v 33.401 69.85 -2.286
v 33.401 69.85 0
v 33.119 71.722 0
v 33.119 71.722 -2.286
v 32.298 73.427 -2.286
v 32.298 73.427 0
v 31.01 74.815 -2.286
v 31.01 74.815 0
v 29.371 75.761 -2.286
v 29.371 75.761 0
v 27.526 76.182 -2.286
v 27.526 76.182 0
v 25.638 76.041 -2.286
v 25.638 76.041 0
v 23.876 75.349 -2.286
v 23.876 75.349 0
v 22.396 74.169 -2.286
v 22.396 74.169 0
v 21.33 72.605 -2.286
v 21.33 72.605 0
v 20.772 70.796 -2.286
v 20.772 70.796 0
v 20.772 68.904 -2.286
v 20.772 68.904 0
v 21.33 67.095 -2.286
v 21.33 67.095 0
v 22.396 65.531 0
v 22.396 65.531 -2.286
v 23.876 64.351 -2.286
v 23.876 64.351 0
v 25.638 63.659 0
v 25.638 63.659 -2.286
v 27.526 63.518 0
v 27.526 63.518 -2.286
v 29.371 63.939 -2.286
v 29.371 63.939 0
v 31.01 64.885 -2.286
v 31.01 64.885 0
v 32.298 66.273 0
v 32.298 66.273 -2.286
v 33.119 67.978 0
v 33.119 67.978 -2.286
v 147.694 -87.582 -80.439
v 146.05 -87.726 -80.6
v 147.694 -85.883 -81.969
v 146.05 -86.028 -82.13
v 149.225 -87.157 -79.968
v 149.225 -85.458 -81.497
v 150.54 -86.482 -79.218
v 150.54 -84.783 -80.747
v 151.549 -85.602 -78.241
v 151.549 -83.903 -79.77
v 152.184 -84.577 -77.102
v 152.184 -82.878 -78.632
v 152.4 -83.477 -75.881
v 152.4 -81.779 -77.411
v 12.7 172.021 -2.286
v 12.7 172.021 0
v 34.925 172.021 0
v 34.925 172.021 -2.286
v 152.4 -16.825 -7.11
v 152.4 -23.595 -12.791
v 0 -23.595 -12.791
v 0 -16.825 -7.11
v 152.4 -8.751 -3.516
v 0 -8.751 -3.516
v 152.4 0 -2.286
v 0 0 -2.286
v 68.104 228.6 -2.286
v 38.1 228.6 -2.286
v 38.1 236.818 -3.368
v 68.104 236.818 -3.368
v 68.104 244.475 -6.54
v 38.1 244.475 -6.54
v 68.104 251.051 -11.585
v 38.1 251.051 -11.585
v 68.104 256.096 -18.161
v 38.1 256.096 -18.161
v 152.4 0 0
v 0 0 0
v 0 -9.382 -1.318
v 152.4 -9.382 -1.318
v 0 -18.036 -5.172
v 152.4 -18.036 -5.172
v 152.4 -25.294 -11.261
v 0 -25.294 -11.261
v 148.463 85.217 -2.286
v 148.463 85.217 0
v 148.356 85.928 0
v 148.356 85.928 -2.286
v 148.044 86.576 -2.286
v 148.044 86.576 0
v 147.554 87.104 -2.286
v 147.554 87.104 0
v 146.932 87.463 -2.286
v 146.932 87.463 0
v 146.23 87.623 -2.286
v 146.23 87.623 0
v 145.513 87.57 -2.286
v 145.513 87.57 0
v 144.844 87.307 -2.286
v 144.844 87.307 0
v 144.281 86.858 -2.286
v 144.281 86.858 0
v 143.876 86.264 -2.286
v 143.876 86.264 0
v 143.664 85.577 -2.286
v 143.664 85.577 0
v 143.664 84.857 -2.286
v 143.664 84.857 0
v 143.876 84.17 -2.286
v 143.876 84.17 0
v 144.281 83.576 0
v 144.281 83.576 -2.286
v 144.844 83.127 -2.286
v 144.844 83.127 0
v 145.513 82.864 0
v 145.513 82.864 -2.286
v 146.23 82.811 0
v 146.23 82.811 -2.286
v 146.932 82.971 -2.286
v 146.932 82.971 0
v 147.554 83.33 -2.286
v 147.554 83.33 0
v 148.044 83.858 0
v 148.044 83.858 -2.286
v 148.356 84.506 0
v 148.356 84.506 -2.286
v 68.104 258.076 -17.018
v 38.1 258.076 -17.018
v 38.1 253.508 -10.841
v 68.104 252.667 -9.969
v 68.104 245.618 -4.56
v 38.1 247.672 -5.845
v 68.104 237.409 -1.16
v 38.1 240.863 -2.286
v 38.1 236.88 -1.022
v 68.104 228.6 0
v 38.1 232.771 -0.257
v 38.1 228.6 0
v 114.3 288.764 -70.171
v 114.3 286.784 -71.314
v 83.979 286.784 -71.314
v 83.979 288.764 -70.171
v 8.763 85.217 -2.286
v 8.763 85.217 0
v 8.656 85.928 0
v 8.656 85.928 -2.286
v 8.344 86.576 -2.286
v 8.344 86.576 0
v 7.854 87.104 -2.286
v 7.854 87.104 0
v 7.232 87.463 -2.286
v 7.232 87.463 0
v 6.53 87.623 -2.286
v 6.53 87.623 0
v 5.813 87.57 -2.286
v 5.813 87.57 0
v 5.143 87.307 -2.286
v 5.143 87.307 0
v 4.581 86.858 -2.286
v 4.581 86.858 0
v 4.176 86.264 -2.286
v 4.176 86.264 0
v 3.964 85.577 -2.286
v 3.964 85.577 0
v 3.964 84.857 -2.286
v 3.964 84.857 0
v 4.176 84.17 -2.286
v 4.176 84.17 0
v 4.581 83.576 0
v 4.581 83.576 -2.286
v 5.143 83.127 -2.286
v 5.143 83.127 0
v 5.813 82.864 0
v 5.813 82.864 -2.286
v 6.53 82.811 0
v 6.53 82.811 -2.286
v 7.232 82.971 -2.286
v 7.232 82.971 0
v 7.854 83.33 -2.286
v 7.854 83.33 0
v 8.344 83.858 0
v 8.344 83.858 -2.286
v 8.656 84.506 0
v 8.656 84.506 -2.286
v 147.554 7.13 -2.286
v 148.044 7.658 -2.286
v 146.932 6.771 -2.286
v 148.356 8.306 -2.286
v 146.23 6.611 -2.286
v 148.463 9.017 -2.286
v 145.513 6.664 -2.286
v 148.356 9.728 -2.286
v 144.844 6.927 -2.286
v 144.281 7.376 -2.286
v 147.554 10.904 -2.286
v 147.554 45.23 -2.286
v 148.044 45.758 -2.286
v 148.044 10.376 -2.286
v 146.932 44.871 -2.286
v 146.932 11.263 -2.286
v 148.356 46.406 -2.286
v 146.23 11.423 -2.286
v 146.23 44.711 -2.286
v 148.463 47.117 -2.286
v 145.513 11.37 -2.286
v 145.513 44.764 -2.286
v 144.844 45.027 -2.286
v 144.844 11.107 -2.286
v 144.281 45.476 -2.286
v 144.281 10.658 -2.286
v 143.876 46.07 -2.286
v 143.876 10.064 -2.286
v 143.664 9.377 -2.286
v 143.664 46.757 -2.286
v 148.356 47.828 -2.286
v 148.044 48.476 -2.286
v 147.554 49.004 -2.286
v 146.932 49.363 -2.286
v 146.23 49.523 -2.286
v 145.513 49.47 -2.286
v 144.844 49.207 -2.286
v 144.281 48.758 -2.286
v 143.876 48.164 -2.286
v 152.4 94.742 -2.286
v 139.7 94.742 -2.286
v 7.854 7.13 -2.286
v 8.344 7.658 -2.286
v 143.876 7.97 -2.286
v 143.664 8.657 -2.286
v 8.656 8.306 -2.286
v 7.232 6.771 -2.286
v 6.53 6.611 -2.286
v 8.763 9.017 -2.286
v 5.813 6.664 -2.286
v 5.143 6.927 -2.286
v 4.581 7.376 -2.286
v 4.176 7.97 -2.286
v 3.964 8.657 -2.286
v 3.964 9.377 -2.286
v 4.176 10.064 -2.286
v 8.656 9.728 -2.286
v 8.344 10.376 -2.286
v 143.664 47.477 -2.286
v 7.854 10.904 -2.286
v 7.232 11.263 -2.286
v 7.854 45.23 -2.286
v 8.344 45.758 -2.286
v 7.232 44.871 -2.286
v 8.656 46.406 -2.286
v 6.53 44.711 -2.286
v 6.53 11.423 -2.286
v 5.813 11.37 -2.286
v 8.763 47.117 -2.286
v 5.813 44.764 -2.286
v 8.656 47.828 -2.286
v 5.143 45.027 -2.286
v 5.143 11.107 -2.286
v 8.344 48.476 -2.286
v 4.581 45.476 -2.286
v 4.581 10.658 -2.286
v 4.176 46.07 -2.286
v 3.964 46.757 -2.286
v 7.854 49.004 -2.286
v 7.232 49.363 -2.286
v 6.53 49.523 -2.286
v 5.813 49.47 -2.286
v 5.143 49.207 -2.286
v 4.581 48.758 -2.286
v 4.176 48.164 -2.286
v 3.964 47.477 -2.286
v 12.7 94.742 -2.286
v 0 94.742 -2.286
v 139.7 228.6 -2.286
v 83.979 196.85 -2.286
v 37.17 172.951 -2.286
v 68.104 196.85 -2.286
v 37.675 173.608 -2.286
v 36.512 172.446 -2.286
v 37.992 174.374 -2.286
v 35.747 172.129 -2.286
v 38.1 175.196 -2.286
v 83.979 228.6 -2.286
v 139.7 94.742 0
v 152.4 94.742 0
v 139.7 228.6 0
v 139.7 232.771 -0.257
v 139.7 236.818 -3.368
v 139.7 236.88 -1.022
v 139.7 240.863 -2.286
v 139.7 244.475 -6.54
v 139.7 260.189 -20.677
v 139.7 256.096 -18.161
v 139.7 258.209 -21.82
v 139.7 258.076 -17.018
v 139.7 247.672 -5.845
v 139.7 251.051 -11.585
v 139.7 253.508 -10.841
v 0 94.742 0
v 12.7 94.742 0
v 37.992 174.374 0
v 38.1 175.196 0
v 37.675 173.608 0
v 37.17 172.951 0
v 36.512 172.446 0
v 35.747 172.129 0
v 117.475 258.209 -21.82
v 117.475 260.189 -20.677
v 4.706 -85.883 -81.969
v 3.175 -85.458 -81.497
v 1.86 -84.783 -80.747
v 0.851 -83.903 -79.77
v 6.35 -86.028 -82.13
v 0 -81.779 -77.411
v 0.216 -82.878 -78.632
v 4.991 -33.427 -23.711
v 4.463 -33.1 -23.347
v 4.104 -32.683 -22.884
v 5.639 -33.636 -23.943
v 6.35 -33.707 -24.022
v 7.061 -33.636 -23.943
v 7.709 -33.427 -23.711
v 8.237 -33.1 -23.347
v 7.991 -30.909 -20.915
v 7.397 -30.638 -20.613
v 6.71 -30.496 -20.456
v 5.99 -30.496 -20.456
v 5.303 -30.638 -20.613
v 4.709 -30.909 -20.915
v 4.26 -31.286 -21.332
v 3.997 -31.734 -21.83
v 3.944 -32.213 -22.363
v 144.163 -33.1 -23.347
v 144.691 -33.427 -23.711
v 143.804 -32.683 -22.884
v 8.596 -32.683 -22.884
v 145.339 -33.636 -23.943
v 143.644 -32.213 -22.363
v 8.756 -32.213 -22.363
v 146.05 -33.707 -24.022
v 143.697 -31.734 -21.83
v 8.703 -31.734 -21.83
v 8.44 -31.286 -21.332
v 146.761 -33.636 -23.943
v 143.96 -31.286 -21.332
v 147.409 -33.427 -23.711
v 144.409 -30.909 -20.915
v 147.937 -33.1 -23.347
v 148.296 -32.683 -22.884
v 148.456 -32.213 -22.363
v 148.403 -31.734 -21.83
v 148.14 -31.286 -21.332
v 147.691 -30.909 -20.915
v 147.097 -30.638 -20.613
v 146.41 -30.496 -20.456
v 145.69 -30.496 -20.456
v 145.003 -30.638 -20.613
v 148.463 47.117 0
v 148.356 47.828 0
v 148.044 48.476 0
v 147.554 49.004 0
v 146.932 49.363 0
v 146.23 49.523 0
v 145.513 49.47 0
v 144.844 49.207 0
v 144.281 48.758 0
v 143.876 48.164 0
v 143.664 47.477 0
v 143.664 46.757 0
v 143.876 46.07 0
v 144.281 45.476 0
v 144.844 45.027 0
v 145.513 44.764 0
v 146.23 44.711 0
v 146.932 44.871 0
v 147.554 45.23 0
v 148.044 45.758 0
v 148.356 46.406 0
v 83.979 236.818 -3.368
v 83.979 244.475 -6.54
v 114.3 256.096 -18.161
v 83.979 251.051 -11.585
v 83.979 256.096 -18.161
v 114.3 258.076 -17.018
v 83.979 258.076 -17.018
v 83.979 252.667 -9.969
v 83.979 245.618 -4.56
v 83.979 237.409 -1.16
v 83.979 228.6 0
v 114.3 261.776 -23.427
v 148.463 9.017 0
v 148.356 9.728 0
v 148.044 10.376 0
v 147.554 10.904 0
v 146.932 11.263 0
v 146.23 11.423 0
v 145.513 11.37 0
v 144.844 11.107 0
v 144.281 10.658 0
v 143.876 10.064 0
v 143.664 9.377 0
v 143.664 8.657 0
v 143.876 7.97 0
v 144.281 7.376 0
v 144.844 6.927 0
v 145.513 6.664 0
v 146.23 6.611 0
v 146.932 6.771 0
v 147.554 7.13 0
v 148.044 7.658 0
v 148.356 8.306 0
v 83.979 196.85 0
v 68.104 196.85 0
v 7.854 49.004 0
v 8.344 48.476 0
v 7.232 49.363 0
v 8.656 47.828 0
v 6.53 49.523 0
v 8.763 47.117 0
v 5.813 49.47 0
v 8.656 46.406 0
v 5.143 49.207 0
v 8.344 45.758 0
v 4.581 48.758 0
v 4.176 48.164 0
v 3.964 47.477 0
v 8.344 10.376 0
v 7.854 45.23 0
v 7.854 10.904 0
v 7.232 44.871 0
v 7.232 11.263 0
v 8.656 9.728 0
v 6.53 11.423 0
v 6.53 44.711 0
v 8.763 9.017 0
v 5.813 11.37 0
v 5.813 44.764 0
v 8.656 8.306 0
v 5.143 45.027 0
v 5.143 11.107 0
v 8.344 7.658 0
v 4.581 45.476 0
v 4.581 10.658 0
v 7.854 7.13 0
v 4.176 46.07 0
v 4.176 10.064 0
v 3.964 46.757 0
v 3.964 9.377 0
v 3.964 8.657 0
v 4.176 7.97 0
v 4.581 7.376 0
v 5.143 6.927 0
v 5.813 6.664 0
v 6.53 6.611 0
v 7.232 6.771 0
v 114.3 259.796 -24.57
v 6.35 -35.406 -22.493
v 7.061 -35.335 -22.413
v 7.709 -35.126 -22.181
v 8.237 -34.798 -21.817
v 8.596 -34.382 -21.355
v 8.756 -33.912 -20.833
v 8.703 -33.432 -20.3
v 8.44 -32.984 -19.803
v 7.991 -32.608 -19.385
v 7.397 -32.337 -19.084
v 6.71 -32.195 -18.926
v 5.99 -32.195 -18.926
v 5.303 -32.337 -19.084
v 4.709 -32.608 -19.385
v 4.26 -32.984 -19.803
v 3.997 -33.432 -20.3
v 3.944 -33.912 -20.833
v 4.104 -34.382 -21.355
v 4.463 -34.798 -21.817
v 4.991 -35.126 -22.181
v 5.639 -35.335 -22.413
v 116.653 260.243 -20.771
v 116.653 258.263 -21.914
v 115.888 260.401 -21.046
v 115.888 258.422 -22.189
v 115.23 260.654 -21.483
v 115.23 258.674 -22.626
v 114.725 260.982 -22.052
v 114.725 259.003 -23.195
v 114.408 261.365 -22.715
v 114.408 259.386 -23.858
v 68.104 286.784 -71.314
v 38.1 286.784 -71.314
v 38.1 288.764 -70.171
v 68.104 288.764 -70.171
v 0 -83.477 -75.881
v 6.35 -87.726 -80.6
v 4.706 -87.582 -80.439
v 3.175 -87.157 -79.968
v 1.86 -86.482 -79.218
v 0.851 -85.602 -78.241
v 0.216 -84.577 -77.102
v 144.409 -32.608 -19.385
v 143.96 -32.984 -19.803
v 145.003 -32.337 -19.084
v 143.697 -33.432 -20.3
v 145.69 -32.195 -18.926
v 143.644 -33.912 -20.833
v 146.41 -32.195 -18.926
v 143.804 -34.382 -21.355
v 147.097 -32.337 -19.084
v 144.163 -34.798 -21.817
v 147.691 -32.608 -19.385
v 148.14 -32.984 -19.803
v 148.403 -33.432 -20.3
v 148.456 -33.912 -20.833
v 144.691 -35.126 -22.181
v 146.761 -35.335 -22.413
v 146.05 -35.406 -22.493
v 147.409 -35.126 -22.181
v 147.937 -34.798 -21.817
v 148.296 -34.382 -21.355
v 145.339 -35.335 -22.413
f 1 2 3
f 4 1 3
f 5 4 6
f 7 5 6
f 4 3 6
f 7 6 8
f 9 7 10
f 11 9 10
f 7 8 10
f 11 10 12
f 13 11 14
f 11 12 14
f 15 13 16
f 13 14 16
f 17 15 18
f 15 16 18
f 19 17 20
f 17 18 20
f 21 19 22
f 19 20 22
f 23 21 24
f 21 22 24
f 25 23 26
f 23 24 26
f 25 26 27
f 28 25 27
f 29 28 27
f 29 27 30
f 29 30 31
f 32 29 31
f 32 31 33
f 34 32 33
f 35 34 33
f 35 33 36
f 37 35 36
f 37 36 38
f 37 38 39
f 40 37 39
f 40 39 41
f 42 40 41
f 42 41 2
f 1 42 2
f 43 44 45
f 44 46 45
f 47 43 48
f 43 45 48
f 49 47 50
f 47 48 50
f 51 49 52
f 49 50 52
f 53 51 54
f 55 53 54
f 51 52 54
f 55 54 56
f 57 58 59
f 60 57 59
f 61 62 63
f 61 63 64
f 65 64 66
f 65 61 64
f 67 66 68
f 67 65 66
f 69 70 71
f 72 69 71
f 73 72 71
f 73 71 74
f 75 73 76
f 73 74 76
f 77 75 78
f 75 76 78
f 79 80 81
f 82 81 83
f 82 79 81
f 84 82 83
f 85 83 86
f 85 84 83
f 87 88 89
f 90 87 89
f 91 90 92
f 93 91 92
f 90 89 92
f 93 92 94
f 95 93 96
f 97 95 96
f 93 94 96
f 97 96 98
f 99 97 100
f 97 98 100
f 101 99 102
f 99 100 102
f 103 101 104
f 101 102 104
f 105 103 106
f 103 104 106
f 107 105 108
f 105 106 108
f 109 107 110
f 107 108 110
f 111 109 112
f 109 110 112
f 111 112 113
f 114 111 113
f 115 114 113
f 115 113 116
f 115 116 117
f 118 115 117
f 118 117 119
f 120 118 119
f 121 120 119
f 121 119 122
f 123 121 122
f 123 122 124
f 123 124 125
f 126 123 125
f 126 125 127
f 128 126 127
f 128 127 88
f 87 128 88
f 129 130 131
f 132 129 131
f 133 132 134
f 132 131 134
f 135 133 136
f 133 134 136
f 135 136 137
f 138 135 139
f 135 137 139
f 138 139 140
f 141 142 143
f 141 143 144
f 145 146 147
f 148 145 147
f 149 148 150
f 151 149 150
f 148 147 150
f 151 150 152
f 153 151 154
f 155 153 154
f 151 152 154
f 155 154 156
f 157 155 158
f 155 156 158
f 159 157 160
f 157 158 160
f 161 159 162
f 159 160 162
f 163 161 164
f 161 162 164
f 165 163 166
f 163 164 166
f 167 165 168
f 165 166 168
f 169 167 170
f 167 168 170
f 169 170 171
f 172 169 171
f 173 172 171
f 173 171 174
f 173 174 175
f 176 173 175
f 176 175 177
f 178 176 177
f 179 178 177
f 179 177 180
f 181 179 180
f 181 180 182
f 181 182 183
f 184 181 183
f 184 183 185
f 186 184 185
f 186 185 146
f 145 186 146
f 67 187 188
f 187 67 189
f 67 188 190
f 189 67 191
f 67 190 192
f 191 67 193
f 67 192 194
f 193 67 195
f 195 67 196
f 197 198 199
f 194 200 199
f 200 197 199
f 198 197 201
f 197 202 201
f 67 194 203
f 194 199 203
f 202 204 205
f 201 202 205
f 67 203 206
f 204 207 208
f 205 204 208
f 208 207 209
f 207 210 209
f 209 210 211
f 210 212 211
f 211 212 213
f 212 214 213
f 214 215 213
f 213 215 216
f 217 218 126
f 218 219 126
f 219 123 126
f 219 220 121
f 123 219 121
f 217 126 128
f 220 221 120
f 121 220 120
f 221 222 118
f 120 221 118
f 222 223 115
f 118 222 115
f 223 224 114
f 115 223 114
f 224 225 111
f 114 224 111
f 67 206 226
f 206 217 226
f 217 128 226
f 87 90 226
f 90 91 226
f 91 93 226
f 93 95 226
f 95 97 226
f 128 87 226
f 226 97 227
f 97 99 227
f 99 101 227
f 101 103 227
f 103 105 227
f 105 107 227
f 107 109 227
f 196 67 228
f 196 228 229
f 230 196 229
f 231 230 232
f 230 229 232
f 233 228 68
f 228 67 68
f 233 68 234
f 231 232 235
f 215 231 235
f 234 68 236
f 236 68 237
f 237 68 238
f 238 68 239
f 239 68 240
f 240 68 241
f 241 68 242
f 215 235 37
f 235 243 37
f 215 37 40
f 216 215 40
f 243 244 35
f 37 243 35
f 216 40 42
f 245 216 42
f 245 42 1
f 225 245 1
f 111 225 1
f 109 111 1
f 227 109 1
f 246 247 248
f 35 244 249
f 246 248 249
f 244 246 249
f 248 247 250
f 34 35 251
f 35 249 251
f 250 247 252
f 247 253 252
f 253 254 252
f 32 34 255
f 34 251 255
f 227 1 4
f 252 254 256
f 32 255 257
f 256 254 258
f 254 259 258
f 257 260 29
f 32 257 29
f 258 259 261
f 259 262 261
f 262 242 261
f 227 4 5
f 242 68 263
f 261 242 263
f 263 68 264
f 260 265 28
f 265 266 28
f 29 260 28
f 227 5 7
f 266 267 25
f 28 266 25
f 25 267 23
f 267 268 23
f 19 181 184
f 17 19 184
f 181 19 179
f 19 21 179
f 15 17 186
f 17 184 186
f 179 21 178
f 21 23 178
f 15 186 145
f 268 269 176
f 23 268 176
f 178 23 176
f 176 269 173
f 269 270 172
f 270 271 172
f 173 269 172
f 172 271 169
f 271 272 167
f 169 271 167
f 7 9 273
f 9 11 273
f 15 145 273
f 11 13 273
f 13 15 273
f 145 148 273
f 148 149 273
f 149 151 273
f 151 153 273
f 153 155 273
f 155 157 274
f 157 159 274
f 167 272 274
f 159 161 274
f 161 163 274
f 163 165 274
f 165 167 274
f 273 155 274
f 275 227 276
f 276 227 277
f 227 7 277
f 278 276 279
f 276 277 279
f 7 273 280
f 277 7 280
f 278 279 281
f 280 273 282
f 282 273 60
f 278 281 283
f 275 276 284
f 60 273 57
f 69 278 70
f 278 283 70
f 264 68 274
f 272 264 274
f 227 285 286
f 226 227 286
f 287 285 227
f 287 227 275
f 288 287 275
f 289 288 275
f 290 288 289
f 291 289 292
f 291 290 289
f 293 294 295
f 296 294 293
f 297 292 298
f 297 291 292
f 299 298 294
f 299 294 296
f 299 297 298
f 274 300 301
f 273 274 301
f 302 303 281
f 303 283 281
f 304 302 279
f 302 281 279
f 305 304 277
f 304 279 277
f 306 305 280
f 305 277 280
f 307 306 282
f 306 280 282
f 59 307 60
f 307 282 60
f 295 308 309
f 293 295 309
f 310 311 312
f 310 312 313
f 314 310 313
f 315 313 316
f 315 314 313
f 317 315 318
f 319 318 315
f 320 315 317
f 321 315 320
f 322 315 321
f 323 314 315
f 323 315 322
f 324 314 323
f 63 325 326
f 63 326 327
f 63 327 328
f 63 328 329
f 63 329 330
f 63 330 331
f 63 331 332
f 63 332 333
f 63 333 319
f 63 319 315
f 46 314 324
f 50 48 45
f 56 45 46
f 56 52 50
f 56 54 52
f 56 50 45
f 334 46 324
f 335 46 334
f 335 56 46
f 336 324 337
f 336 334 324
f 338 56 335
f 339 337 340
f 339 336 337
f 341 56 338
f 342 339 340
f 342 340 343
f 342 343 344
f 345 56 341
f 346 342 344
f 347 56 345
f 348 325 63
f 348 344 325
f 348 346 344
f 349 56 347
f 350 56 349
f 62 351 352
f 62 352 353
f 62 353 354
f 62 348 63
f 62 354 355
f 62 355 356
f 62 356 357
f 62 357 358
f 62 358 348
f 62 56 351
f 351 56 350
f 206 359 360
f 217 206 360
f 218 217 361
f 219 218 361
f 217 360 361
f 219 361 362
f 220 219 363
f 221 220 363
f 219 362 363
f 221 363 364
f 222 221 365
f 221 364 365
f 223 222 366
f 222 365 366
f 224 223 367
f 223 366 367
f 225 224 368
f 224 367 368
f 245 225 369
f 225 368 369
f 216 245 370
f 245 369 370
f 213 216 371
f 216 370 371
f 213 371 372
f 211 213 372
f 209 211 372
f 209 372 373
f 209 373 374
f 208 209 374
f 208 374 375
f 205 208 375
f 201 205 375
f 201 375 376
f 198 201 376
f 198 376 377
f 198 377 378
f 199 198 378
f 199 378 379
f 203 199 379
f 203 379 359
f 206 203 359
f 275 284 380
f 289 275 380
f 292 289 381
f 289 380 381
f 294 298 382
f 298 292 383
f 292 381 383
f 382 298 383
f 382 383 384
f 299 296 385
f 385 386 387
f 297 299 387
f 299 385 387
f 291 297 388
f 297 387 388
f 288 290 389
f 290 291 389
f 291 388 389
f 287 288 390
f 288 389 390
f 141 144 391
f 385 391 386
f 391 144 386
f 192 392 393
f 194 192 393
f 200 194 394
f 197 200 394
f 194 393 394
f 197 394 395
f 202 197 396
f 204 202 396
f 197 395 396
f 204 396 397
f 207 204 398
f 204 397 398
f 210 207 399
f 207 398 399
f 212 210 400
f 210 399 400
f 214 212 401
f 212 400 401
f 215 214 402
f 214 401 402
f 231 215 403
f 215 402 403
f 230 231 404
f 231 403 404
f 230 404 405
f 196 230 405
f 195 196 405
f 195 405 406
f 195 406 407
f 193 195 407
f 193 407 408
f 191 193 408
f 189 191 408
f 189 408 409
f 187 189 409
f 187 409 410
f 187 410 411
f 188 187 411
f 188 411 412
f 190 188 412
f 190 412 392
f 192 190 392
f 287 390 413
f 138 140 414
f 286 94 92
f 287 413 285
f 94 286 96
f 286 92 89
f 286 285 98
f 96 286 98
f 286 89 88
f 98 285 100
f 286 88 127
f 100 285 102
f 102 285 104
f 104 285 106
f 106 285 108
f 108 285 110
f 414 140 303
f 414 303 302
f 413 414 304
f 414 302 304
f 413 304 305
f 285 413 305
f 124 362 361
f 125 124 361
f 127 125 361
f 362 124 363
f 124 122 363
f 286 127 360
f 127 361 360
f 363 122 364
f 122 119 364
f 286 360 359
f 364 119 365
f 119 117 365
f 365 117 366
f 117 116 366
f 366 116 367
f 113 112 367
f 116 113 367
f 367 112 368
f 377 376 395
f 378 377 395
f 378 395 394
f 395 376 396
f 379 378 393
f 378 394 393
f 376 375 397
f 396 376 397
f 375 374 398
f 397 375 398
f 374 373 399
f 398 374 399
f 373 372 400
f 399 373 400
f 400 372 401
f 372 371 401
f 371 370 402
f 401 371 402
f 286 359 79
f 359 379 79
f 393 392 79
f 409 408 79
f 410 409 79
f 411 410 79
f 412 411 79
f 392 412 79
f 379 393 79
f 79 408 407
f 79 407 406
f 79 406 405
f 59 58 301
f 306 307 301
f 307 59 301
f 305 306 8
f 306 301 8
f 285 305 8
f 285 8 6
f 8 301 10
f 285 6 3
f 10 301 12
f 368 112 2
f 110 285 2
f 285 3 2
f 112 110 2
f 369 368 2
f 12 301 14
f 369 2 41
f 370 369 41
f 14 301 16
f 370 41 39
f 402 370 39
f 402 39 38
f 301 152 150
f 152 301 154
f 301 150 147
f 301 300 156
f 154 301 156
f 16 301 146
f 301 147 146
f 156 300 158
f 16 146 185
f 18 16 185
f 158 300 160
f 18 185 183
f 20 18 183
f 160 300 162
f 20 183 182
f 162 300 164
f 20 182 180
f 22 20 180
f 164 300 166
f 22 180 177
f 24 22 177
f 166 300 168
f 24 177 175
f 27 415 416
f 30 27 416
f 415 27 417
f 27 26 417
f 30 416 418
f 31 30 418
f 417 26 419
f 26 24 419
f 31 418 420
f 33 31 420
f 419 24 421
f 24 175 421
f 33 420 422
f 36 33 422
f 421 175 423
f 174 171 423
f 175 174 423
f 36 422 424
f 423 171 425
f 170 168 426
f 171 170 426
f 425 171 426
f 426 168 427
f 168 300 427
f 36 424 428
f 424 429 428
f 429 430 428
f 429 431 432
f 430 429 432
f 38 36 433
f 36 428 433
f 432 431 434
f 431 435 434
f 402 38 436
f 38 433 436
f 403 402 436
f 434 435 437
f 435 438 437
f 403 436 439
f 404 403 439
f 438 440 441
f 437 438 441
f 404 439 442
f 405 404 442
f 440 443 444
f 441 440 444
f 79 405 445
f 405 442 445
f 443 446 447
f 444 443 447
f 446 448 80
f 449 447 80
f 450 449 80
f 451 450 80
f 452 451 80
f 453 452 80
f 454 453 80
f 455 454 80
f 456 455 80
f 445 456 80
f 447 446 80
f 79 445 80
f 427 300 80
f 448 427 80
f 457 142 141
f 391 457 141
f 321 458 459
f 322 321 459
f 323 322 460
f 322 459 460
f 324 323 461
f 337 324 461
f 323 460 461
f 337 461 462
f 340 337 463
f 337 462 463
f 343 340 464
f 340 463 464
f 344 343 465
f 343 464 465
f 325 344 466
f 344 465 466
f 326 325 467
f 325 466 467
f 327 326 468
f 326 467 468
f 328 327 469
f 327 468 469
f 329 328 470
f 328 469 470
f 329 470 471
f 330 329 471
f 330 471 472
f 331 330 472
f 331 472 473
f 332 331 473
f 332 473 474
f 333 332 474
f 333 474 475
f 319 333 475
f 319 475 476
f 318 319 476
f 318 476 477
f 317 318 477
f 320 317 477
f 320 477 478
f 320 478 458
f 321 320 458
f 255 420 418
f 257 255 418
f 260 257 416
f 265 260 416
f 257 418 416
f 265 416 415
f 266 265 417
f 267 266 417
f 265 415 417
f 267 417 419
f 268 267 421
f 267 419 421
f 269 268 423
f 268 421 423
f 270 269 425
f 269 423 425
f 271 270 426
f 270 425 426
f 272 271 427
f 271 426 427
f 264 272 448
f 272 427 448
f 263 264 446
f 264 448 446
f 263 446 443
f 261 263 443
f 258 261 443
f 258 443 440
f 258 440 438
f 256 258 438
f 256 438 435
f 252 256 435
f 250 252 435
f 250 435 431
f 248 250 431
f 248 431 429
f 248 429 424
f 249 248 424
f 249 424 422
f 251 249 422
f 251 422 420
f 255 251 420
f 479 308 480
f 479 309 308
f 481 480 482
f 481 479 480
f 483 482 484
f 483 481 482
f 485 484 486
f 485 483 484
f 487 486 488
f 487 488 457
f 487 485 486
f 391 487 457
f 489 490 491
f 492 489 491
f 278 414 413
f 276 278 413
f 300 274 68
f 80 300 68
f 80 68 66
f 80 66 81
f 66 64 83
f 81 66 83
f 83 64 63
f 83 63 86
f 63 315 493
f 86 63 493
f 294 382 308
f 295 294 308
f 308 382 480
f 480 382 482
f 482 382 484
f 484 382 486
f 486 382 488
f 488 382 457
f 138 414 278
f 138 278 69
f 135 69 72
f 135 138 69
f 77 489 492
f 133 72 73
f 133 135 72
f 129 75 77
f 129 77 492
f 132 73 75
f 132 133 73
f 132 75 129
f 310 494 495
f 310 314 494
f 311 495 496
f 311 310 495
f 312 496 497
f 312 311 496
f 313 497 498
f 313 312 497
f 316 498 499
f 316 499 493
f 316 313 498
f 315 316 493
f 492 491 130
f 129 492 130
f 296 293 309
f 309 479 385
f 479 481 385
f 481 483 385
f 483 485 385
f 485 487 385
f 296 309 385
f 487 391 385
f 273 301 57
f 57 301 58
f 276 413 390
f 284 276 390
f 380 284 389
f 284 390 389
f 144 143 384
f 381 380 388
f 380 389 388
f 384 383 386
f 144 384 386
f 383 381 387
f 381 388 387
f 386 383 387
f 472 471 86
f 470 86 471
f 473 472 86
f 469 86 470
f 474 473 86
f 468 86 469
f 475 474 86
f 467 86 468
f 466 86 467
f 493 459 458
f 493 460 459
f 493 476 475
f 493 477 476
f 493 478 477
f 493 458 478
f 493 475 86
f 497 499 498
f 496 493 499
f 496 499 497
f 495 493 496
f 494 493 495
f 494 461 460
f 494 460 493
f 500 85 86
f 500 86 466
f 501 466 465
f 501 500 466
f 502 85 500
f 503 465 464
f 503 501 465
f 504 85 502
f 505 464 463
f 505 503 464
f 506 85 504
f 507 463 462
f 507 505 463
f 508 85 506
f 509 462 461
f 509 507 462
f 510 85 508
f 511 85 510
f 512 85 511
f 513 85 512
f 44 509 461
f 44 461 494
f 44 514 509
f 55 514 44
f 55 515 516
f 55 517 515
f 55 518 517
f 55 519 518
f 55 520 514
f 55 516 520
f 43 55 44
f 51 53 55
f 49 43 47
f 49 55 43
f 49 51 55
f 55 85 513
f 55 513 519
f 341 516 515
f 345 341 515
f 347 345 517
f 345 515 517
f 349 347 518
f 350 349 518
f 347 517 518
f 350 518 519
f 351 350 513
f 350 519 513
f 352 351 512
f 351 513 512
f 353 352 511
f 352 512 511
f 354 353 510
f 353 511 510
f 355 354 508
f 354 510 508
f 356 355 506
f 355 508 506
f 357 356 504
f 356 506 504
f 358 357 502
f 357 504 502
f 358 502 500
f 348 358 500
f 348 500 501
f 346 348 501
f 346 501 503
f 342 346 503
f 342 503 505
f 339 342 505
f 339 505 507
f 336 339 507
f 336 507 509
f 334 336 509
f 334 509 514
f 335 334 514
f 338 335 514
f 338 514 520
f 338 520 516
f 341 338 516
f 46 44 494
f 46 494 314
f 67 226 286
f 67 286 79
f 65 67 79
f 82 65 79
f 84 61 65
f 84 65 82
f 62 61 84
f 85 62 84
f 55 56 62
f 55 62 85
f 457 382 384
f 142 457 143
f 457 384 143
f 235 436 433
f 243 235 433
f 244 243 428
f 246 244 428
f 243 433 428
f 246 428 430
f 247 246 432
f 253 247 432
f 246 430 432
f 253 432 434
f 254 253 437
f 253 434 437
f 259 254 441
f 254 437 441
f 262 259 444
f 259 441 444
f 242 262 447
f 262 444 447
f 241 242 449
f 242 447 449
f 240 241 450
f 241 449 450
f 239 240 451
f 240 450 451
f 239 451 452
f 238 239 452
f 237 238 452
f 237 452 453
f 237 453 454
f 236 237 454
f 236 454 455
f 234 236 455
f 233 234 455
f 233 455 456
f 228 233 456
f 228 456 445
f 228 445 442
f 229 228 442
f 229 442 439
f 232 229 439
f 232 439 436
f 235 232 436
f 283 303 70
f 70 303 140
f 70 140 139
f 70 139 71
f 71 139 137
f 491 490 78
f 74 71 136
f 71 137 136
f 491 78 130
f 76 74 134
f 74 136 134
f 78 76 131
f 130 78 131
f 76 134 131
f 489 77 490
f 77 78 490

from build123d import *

# Parameters (mm, degrees)
BASE_FLANGE1_DEPTH = 2.286
SKETCH6_R          = 6.35
CUT_EXTRUDE1_DEPTH = 275.752517361
EDGE_FLANGE1_DEPTH = 152.4
FILLET1_R          = 6.35
EDGE_FLANGE2_DEPTH = 127
UNFOLD1_START      = 12.7
UNFOLD1_DEPTH      = 127
UNFOLD1_2_DEPTH    = 127
SKETCH15_W         = 25.4
SKETCH15_H         = 152.4
SKETCH15_H_2       = 57.15
CUT_EXTRUDE2_DEPTH = 2.54
FOLD1_START        = 38.1
FOLD1_DEPTH        = 101.6
FOLD1_2_DEPTH      = 76.2
FOLD1_START_2      = 114.3
FOLD1_3_DEPTH      = 25.4
FILLET2_R          = 3.175
SKETCH16_W         = 15.875
SKETCH16_H         = 203.2
CUT_EXTRUDE3_DEPTH = 337.68309673
SKETCH17_R         = 2.413
CUT_EXTRUDE4_DEPTH = 337.68309673
SKETCH18_R         = 2.413
CUT_EXTRUDE5_DEPTH = 2.54


# Read off the part's stored shape, not the designer's step: Unfold1, Fold1
# Sheet-metal steps are written as plain solids
with BuildPart() as part:
    # Sketch1 → Base-Flange1 (new body)
    with BuildSketch(Plane.XY):
        Polygon((139.7, 94.742), (152.4, 94.742), (152.4, 0), (0, 0), (0, 94.742), (12.7, 94.742), (12.7, 228.6), (139.7, 228.6), align=None)
    extrude(amount=-BASE_FLANGE1_DEPTH)

    # Sketch6 → Cut-Extrude1 (cut, through all)
    with BuildSketch(Plane.XY):
        with Locations((27.051, 69.85)):
            Circle(SKETCH6_R)
    extrude(amount=-CUT_EXTRUDE1_DEPTH, mode=Mode.SUBTRACT)

    # Edge-Flange1 section (across the edge) → Edge-Flange1 (add)
    with BuildSketch(Plane(origin=(152.4, -14.136010759, -2.286), x_dir=(0, 0.7431448254773909, -0.6691306063588619), z_dir=(-1, 0, 0))):
        with BuildLine():
            Line((-2.286, 14.136010759), (-2.286, 107.440207225))
            Line((-2.286, 107.440207225), (0, 107.440207225))
            Line((0, 107.440207225), (0, 14.136010759))
            ThreePointArc((0, 14.136010759), (2.74493172, 1.222122341), (10.505103248, -9.45883745))
            Line((10.505103248, -9.45883745), (8.975470682, -11.157666521))
            ThreePointArc((8.975470682, -11.157666521), (0.656566804, 0.292322375), (-2.286, 14.136010759))
        make_face()
    extrude(amount=EDGE_FLANGE1_DEPTH)

    # Fillet1
    fillet1_edges = [part.edges().sort_by_distance(p)[0] for p in [
        (152.4, -86.876956302, -81.364817765),
        (0, -86.876956302, -81.364817765),
    ]]
    fillet(fillet1_edges, radius=FILLET1_R)

    # Edge-Flange2 section (across the edge) → Edge-Flange2 (add)
    with BuildSketch(Plane(origin=(12.7, 246.930871047, -2.286), x_dir=(0, -0.8660254037844364, -0.5000000000000041), z_dir=(1, 0, 0))):
        with BuildLine():
            Line((-2.286, 18.330871047), (-2.286, 79.706177285))
            Line((-2.286, 79.706177285), (0, 79.706177285))
            Line((0, 79.706177285), (0, 18.330871047))
            ThreePointArc((0, 18.330871047), (4.25369343, 2.455871047), (15.875, -9.165435523))
            Line((15.875, -9.165435523), (14.732, -11.145169596))
            ThreePointArc((14.732, -11.145169596), (2.273959357, 1.312871047), (-2.286, 18.330871047))
        make_face()
    extrude(amount=EDGE_FLANGE2_DEPTH)

    # Unfold1 outline → Unfold1 (cut)
    with BuildSketch(Plane.YZ.offset(UNFOLD1_START)):
        with BuildLine():
            Line((240.863229427, -2.286), (228.6, -2.286))
            ThreePointArc((228.6, -2.286), (244.475, -6.53969343), (256.09630657, -18.161))
            Line((256.09630657, -18.161), (286.783959689, -71.313574367))
            Line((286.783959689, -71.313574367), (288.763693762, -70.170574367))
            Line((288.763693762, -70.170574367), (258.076040643, -17.018))
            ThreePointArc((258.076040643, -17.018), (250.731417092, -8.177738777), (240.863229427, -2.286))
        make_face()
    extrude(amount=UNFOLD1_DEPTH, mode=Mode.SUBTRACT)

    # Unfold1 2 outline → Unfold1 2 (add)
    with BuildSketch(Plane.YZ.offset(UNFOLD1_START)):
        with BuildLine():
            ThreePointArc((228.6, 0), (234.837238812, -0.576380337), (240.863229427, -2.286))
            Line((240.863229427, -2.286), (324.420775289, -2.286))
            Line((324.420775289, -2.286), (324.420775289, 0))
            Line((324.420775289, 0), (228.6, 0))
        make_face()
    extrude(amount=UNFOLD1_2_DEPTH)

    # Sketch15 → Cut-Extrude2 (cut)
    with BuildSketch(Plane.XY):
        with Locations((25.4, 248.220775289)):
            Rectangle(SKETCH15_W, SKETCH15_H)
        with Locations((127, 295.845775289)):
            Rectangle(SKETCH15_W, SKETCH15_H_2)
    extrude(amount=-CUT_EXTRUDE2_DEPTH, mode=Mode.SUBTRACT)

    # Fold1 outline → Fold1 (cut)
    with BuildSketch(Plane.YZ.offset(FOLD1_START)):
        with BuildLine():
            ThreePointArc((228.6, 0), (234.837238812, -0.576380337), (240.863229427, -2.286))
            Line((240.863229427, -2.286), (324.420775289, -2.286))
            Line((324.420775289, -2.286), (324.420775289, 0))
            Line((324.420775289, 0), (228.6, 0))
        make_face()
    extrude(amount=FOLD1_DEPTH, mode=Mode.SUBTRACT)

    # Fold1 2 outline → Fold1 2 (add)
    with BuildSketch(Plane.YZ.offset(FOLD1_START)):
        with BuildLine():
            ThreePointArc((228.6, -2.286), (244.475, -6.53969343), (256.09630657, -18.161))
            Line((256.09630657, -18.161), (286.783959689, -71.313574367))
            Line((286.783959689, -71.313574367), (288.763693762, -70.170574367))
            Line((288.763693762, -70.170574367), (258.076040643, -17.018))
            ThreePointArc((258.076040643, -17.018), (250.731417092, -8.177738777), (240.863229427, -2.286))
            Line((240.863229427, -2.286), (228.6, -2.286))
        make_face()
    extrude(amount=FOLD1_2_DEPTH)

    # Fold1 3 outline → Fold1 3 (add)
    with BuildSketch(Plane.YZ.offset(FOLD1_START_2)):
        with BuildLine():
            ThreePointArc((228.6, -2.286), (244.475, -6.53969343), (256.09630657, -18.161))
            Line((256.09630657, -18.161), (258.208959689, -21.820222541))
            Line((258.208959689, -21.820222541), (260.188693762, -20.677222541))
            Line((260.188693762, -20.677222541), (258.076040643, -17.018))
            ThreePointArc((258.076040643, -17.018), (250.731417092, -8.177738777), (240.863229427, -2.286))
            Line((240.863229427, -2.286), (228.6, -2.286))
        make_face()
    extrude(amount=FOLD1_3_DEPTH)

    # Fillet2
    fillet2_edges = [part.edges().sort_by_distance(p)[0] for p in [
        (38.1, 172.020775289, -1.143),
        (114.3, 259.198826725, -21.248722541),
    ]]
    fillet(fillet2_edges, radius=FILLET2_R)

    # Sketch16 → Cut-Extrude3 (cut, through all)
    with BuildSketch(Plane.XY):
        with Locations((76.04125, 298.45)):
            Rectangle(SKETCH16_W, SKETCH16_H)
    extrude(amount=-CUT_EXTRUDE3_DEPTH, mode=Mode.SUBTRACT)

    # Sketch17 → Cut-Extrude4 (cut, through all)
    with BuildSketch(Plane.XY):
        with Locations((6.35, 85.217)):
            Circle(SKETCH17_R)
        with Locations((6.35, 47.117)):
            Circle(SKETCH17_R)
        with Locations((6.35, 9.017)):
            Circle(SKETCH17_R)
        with Locations((146.05, 47.117)):
            Circle(SKETCH17_R)
        with Locations((146.05, 9.017)):
            Circle(SKETCH17_R)
        with Locations((146.05, 85.217)):
            Circle(SKETCH17_R)
    extrude(amount=-CUT_EXTRUDE4_DEPTH, mode=Mode.SUBTRACT)

    # Sketch18 → Cut-Extrude5 (cut)
    with BuildSketch(Plane(origin=(0, -8.368903665, 7.535394706), x_dir=(1, 0, 0), z_dir=(0, -0.7431448254773909, 0.6691306063588619))):
        with Locations(Location((6.35, -37.99367728, 0), (0, 0, 270))):
            Circle(SKETCH18_R)
        with Locations(Location((146.05, -37.99367728, 0), (0, 0, 270))):
            Circle(SKETCH18_R)
    extrude(amount=-CUT_EXTRUDE5_DEPTH, mode=Mode.SUBTRACT)


solid = part.part
